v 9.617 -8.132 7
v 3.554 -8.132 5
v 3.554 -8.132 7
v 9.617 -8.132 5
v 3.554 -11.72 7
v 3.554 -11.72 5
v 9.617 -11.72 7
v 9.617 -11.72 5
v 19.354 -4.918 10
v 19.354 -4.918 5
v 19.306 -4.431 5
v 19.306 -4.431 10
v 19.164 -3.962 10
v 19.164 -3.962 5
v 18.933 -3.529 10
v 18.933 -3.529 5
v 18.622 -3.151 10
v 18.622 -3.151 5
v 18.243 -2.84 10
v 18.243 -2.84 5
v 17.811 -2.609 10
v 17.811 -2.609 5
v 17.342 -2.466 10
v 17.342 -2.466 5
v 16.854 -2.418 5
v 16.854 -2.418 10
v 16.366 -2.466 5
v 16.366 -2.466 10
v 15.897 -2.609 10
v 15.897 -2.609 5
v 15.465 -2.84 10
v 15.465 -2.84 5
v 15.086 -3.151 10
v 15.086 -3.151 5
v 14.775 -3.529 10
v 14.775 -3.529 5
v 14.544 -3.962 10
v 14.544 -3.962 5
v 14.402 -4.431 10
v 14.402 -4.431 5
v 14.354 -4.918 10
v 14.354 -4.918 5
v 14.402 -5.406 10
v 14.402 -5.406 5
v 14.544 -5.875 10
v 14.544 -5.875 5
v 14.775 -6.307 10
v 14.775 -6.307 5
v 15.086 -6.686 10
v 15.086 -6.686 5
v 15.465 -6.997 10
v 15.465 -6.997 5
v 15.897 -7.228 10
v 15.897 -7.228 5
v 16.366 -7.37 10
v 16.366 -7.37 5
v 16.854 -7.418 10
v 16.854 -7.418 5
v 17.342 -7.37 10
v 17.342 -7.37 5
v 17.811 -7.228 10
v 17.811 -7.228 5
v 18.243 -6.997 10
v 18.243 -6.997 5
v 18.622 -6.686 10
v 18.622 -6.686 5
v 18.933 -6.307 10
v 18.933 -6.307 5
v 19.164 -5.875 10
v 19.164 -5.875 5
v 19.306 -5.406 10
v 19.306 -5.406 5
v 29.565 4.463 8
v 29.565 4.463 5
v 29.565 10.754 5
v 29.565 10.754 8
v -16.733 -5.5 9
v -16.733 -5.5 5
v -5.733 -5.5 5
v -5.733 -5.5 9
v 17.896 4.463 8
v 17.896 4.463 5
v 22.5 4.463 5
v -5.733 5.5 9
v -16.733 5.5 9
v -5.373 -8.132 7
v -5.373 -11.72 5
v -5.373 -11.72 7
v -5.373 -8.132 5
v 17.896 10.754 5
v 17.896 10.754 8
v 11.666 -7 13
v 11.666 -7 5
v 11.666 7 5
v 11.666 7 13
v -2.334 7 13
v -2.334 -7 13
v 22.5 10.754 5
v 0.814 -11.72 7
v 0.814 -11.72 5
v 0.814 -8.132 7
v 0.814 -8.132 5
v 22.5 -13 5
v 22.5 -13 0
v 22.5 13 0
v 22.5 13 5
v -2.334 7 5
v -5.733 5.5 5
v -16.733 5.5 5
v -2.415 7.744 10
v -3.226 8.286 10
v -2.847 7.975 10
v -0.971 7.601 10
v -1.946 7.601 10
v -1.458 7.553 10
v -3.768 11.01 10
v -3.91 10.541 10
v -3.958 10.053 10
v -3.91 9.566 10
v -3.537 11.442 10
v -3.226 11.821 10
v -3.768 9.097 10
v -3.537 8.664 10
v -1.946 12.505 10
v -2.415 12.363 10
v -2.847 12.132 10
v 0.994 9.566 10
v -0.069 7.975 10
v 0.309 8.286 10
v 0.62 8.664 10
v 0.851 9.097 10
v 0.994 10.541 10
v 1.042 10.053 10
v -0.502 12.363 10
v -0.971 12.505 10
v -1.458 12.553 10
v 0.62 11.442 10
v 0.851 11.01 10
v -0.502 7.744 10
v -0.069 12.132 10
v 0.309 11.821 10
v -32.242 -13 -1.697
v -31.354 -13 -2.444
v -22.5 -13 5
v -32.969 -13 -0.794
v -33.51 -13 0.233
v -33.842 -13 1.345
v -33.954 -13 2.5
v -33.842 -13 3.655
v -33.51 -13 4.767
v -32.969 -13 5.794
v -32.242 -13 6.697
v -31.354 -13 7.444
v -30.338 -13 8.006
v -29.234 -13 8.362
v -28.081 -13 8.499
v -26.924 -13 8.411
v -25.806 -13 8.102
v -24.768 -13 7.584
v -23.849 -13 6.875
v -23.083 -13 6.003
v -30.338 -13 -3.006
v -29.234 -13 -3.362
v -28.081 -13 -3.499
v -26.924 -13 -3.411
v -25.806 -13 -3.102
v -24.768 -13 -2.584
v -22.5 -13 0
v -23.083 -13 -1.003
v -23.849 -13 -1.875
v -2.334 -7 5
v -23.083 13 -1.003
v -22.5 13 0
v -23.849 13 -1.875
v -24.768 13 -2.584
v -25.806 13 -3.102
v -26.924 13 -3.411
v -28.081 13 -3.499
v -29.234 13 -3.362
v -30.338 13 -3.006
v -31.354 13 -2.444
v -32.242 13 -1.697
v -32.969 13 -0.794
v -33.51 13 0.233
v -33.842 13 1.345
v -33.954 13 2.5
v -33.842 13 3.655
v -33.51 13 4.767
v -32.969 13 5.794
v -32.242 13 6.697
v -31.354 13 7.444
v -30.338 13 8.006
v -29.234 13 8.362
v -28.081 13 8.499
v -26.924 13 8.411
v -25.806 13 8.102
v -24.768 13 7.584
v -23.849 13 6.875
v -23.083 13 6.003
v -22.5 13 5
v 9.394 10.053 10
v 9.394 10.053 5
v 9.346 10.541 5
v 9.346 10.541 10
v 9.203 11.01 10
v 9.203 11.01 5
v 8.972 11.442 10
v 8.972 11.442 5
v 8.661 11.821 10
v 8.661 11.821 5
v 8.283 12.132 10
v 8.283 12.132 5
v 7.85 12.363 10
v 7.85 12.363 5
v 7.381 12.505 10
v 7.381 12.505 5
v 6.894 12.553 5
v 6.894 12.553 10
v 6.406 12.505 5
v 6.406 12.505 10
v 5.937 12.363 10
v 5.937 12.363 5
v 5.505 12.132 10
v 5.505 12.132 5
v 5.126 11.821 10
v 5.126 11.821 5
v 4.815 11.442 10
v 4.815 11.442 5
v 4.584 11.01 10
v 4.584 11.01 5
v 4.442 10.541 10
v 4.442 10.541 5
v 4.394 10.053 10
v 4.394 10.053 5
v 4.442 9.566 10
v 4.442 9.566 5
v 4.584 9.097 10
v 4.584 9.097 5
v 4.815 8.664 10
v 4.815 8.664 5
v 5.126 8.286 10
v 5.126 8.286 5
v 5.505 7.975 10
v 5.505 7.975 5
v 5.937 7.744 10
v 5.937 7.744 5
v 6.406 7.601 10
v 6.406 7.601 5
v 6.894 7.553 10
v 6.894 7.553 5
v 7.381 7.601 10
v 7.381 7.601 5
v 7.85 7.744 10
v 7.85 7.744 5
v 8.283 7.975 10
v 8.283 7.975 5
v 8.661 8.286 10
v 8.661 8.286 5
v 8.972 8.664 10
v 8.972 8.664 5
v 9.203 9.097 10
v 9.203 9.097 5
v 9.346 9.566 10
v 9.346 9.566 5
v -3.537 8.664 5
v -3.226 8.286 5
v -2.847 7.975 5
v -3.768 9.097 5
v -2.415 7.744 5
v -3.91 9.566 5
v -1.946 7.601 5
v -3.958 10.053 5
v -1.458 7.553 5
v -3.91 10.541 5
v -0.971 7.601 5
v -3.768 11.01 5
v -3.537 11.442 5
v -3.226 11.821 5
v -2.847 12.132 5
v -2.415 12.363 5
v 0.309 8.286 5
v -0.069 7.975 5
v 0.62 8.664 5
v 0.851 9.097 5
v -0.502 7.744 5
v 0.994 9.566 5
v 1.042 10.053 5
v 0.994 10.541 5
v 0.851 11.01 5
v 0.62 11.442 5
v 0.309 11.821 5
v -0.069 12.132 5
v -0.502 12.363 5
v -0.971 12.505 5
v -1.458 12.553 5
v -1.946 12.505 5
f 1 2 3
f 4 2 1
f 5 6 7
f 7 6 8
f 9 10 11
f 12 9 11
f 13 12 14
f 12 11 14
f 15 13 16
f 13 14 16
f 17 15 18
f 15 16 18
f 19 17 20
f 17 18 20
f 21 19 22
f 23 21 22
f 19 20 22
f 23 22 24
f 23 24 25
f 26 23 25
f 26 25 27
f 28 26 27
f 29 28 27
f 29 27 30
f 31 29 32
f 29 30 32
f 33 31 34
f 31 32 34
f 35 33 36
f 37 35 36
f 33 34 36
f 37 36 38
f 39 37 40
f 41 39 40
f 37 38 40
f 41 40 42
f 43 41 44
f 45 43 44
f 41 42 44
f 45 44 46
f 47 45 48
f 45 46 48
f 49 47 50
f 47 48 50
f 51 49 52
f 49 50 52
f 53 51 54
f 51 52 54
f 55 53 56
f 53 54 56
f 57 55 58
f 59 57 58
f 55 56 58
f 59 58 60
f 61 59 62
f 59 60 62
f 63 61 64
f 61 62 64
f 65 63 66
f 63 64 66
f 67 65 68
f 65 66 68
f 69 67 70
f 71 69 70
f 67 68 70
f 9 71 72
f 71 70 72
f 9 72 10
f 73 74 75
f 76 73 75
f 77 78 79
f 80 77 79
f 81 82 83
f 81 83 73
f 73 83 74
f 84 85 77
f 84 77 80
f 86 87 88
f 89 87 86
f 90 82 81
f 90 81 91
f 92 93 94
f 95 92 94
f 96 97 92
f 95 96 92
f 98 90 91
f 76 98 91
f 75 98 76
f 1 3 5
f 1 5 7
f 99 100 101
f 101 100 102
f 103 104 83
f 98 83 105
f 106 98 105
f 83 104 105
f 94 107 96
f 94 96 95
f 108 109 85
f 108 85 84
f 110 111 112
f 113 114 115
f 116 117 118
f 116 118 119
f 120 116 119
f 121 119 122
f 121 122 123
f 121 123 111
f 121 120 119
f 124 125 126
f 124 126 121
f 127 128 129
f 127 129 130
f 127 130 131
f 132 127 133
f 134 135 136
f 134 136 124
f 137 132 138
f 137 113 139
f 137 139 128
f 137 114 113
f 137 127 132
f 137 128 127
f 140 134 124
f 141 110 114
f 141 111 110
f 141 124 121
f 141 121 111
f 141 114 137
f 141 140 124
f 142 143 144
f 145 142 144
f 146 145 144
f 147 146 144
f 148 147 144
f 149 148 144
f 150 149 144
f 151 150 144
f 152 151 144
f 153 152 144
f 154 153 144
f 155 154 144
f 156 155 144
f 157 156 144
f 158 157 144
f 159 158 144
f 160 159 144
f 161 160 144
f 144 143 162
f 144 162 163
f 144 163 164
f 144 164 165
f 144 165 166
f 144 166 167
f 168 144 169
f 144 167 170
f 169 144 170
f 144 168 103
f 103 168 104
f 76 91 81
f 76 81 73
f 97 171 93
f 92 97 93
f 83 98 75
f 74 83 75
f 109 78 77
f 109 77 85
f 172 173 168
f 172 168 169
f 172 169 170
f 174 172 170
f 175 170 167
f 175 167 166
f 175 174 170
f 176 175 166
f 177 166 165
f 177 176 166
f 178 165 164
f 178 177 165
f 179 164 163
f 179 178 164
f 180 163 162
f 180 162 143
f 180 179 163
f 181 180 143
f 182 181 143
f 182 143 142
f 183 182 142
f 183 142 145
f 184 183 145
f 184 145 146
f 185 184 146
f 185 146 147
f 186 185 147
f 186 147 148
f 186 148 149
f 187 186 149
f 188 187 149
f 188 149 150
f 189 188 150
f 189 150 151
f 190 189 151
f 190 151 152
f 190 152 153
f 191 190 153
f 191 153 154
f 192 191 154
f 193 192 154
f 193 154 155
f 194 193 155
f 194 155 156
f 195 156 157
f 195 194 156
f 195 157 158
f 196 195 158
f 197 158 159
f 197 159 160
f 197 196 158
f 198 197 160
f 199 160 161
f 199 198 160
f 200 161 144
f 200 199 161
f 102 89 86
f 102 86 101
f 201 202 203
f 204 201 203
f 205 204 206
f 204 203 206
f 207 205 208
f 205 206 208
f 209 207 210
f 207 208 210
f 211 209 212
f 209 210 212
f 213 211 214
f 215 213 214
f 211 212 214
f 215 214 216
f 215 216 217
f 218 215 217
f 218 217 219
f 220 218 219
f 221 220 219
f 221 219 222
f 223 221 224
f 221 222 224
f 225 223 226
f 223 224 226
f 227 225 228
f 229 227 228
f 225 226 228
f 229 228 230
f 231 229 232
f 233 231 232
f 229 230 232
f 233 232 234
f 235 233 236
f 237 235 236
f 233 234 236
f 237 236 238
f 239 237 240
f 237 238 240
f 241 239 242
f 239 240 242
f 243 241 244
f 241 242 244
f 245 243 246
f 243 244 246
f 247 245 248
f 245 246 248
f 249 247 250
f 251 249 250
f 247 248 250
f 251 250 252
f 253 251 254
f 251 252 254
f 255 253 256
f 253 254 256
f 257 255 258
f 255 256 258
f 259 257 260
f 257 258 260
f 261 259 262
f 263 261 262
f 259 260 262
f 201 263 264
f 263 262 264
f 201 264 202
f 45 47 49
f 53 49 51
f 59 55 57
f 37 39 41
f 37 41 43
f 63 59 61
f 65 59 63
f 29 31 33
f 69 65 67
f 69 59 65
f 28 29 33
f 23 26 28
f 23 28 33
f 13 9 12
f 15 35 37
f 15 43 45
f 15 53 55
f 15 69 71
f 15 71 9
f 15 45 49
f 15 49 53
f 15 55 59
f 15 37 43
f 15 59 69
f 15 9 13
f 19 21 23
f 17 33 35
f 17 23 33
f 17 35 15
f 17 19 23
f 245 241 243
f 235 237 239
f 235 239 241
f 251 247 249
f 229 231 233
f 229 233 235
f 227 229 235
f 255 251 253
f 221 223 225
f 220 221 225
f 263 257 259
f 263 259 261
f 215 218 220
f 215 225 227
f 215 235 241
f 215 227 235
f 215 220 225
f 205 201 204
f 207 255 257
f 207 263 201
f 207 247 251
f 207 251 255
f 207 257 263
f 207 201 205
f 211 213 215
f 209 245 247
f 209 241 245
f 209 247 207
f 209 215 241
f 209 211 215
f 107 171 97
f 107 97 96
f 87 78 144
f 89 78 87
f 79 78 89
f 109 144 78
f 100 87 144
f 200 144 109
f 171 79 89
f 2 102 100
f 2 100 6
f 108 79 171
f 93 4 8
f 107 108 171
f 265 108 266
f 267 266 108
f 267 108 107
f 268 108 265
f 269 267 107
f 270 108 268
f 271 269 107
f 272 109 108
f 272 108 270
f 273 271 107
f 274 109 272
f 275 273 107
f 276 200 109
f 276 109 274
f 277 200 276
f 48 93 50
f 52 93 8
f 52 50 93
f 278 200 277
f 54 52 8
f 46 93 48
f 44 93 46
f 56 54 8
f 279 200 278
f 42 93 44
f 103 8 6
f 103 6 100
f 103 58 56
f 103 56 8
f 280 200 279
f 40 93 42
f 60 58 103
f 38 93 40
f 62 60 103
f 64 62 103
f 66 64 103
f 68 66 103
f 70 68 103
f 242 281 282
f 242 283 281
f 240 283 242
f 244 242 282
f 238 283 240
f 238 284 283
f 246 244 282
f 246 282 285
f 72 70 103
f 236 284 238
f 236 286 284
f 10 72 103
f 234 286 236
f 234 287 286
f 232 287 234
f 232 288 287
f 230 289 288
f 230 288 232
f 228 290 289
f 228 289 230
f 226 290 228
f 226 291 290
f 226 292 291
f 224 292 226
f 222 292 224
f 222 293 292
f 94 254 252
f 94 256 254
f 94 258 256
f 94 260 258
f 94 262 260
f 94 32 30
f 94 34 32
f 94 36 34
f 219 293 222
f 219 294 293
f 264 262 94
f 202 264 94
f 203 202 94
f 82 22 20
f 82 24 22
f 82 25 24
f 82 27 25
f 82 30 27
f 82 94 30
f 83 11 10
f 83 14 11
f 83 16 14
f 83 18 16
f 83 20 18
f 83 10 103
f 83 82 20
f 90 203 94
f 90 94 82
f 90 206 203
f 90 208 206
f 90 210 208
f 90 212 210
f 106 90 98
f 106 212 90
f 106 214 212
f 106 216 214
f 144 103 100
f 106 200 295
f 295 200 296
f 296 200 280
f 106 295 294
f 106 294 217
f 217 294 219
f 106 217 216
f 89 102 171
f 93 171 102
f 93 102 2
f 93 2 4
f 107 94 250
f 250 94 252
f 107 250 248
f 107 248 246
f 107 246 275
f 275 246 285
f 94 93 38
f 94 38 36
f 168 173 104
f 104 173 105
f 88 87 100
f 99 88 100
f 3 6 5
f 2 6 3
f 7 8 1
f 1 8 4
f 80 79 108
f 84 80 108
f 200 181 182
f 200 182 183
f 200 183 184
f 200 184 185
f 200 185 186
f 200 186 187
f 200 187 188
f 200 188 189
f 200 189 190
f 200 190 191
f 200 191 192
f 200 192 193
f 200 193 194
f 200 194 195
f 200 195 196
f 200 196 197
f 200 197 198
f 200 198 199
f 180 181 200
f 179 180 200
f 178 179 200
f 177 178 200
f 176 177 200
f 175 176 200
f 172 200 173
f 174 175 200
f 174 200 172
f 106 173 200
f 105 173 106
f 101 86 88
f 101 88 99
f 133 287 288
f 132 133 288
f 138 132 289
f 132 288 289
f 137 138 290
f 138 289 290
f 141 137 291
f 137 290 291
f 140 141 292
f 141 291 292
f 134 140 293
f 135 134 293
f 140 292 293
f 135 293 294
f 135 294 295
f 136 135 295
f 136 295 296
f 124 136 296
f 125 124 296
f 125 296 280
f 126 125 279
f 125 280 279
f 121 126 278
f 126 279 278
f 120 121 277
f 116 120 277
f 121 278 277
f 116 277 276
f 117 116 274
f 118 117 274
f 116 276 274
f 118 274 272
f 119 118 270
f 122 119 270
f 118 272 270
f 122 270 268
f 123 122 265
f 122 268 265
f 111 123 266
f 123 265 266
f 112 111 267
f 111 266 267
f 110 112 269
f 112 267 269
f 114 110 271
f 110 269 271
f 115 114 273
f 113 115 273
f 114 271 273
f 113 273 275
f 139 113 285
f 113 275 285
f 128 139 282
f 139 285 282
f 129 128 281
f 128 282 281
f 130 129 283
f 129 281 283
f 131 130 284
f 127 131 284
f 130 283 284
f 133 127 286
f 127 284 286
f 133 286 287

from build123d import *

# Parameters (mm, degrees)
SKETCH_1_W      = 45
SKETCH_1_H      = 26
EXTRUDE_1_DEPTH = 5
SKETCH_2_R      = 6
EXTRUDE_2_DEPTH = 26
SKETCH_3_W      = 14
SKETCH_3_H      = 14
EXTRUDE_3_DEPTH = 8
SKETCH_4_R      = 2.5
EXTRUDE_4_DEPTH = 5
SKETCH_5_W      = 11
SKETCH_5_H      = 11
EXTRUDE_5_DEPTH = 4
SKETCH_6_W      = 6.186657106
SKETCH_6_H      = 3.588261122
SKETCH_6_W_2    = 6.062923964
EXTRUDE_6_DEPTH = 2
SKETCH_7_W      = 11.669170616
SKETCH_7_H      = 6.291205027
EXTRUDE_7_DEPTH = 3


with BuildPart() as part:
    # Эскиз1 → Бобышка-Вытянуть1 (new body)
    with BuildSketch(Plane.XY):
        Rectangle(SKETCH_1_W, SKETCH_1_H)
    extrude(amount=EXTRUDE_1_DEPTH)

    # Эскиз2 → Бобышка-Вытянуть2 (add)
    with BuildSketch(Plane(origin=(0, 13, 0), x_dir=(1, 0, 0), z_dir=(0, 1, 0))):
        with Locations((-27.954356057, -2.5)):
            Circle(SKETCH_2_R)
    extrude(amount=-EXTRUDE_2_DEPTH)

    # Эскиз3 → Бобышка-Вытянуть3 (add)
    with BuildSketch(Plane.XY.offset(5)):
        with Locations((4.666405911, 0)):
            Rectangle(SKETCH_3_W, SKETCH_3_H)
    extrude(amount=EXTRUDE_3_DEPTH)

    # Эскиз4 → Бобышка-Вытянуть4 (add)
    with BuildSketch(Plane.XY.offset(5)):
        with Locations((-1.458384625, 10.053317798)):
            Circle(SKETCH_4_R)
        with Locations((6.893602469, 10.053317798)):
            Circle(SKETCH_4_R)
        with Locations((16.854120411, -4.9183924)):
            Circle(SKETCH_4_R)
    extrude(amount=EXTRUDE_4_DEPTH)

    # Эскиз5 → Бобышка-Вытянуть5 (add)
    with BuildSketch(Plane.XY.offset(5)):
        with Locations((-11.233302854, 0)):
            Rectangle(SKETCH_5_W, SKETCH_5_H)
    extrude(amount=EXTRUDE_5_DEPTH)

    # Эскиз6 → Бобышка-Вытянуть6 (add)
    with BuildSketch(Plane.XY.offset(5)):
        with Locations((-2.279728316, -9.926144411)):
            Rectangle(SKETCH_6_W, SKETCH_6_H)
        with Locations((6.585206892, -9.926144411)):
            Rectangle(SKETCH_6_W_2, SKETCH_6_H)
    extrude(amount=EXTRUDE_6_DEPTH)

    # Эскиз7 → Бобышка-Вытянуть7 (add)
    with BuildSketch(Plane.XY.offset(5)):
        with Locations((23.730450038, 7.608351051)):
            Rectangle(SKETCH_7_W, SKETCH_7_H)
    extrude(amount=EXTRUDE_7_DEPTH)


solid = part.part
